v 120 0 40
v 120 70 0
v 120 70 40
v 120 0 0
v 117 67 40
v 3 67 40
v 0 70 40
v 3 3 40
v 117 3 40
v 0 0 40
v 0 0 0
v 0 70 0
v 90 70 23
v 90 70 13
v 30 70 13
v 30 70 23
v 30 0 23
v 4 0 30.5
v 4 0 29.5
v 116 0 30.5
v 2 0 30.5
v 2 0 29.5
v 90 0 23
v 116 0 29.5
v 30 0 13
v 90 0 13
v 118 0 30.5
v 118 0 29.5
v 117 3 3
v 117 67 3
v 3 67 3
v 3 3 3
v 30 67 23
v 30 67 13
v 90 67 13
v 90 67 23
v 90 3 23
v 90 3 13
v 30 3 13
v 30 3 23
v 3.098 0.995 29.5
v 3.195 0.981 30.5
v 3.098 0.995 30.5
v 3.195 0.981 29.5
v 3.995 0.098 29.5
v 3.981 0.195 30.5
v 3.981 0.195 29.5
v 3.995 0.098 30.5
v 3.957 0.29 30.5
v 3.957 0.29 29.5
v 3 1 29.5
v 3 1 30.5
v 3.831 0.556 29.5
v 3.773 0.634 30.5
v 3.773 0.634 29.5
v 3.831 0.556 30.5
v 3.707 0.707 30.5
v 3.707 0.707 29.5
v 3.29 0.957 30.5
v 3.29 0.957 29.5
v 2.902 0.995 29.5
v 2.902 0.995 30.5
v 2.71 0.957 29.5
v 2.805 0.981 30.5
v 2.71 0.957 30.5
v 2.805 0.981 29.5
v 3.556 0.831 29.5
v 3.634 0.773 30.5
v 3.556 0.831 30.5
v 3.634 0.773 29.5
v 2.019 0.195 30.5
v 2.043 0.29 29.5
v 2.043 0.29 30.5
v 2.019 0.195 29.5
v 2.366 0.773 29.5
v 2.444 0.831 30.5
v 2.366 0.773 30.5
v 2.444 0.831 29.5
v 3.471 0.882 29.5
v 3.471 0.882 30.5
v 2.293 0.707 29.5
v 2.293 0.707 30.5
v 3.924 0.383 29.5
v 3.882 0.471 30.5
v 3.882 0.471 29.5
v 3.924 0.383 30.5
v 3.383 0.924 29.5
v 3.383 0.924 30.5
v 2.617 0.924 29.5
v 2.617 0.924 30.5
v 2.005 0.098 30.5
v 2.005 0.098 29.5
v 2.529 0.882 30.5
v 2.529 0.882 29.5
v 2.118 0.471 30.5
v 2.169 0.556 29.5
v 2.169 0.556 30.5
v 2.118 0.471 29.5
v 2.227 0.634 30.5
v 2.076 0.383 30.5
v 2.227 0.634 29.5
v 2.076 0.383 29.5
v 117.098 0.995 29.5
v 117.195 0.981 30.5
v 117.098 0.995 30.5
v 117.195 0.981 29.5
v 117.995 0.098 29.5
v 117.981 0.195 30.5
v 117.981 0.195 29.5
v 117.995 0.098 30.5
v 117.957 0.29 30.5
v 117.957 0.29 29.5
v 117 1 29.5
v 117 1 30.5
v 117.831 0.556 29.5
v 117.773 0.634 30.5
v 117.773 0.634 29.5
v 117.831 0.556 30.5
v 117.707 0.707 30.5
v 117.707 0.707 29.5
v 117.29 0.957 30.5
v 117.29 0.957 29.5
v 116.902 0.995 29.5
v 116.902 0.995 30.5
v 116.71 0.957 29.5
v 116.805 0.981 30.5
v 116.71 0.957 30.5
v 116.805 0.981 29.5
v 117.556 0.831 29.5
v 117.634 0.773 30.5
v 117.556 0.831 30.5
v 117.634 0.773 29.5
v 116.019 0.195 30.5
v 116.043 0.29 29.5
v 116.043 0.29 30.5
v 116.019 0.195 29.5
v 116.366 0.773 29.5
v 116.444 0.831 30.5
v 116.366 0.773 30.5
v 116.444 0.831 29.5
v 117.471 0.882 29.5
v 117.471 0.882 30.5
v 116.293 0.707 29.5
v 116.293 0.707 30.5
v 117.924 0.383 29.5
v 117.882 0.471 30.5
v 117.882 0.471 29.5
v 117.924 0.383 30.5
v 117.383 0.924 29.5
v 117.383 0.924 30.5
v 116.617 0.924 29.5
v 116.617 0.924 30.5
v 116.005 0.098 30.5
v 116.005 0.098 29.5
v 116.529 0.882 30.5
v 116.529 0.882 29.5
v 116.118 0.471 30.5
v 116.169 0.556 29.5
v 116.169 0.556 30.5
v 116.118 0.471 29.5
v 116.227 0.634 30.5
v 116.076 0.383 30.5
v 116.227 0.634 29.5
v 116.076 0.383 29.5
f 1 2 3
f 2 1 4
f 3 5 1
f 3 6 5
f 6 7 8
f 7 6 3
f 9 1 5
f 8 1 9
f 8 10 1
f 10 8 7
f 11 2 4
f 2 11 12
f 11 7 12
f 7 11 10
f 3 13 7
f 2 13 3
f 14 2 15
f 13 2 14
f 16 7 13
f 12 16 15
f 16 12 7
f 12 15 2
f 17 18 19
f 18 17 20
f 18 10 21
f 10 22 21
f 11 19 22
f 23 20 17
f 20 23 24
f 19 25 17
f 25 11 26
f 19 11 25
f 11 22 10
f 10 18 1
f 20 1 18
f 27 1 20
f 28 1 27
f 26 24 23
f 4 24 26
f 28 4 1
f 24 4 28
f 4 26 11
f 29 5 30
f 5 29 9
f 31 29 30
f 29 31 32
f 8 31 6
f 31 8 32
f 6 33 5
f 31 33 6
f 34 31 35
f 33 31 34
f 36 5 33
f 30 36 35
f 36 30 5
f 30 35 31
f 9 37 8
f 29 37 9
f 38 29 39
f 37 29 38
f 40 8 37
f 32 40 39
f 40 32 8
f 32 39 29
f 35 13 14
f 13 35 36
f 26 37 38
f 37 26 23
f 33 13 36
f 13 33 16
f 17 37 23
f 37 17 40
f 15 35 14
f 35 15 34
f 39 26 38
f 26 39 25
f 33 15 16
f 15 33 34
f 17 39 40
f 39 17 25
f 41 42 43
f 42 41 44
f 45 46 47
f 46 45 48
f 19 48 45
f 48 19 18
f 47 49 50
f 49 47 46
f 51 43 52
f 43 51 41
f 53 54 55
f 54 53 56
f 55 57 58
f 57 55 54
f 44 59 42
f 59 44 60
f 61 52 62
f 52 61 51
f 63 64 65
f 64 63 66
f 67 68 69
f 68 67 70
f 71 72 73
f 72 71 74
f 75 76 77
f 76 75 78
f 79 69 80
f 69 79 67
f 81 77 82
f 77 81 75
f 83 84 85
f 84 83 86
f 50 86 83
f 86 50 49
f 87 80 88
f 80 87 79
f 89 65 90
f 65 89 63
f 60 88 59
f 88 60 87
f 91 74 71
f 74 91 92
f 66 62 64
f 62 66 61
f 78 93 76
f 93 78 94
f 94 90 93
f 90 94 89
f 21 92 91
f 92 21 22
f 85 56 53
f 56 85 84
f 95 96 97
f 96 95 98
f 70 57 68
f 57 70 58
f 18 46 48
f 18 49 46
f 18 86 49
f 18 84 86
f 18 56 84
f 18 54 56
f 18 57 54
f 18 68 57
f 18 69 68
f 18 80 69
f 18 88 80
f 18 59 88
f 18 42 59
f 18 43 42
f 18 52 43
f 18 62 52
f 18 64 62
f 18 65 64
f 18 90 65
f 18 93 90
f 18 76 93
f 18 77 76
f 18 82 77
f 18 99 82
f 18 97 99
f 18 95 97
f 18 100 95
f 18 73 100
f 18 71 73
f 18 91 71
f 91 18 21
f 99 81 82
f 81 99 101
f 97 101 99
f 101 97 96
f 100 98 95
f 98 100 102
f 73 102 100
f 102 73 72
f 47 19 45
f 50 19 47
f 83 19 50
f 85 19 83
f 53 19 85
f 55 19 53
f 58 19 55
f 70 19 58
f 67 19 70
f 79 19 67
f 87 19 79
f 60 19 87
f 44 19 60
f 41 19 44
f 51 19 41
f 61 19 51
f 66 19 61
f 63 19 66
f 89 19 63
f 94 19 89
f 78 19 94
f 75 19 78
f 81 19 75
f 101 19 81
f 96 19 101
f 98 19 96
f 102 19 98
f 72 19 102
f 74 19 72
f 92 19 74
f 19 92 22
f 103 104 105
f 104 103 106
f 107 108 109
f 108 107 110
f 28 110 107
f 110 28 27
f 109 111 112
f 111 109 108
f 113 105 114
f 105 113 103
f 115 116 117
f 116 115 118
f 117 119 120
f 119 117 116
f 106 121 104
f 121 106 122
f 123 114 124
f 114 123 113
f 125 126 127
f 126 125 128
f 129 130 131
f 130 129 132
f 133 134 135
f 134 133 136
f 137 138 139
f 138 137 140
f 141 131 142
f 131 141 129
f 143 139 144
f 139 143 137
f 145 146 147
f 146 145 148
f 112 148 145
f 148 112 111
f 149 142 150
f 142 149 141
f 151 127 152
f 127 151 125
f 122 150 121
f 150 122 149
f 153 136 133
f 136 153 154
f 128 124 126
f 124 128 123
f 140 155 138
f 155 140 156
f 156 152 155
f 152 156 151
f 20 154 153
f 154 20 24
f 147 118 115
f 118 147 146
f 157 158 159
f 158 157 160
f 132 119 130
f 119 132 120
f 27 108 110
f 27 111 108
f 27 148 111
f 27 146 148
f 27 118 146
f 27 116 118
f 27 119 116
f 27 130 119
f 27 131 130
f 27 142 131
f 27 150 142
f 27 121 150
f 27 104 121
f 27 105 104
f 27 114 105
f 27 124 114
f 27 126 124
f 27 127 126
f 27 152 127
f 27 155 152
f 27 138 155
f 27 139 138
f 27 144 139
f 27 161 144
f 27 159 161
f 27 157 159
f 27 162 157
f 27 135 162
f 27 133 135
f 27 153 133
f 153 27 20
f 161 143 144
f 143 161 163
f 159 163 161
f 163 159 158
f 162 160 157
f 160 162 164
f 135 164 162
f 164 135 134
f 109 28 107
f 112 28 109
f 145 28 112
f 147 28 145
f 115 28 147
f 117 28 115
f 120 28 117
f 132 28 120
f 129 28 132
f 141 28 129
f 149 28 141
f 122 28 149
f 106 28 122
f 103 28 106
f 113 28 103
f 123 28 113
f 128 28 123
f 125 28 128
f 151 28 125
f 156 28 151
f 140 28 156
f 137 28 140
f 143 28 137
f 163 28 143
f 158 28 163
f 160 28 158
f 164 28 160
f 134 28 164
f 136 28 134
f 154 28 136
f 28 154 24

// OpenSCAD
// Buffer tank for mini horizontal gel-electrophoresis box
// Outer dimensions: 120 mm (X) x 70 mm (Y) x 40 mm (Z)
// Wall thickness: 3 mm
// Floor thickness: 3 mm
// Platform: 60 mm (X) x 70 mm (Y) x 10 mm (Z), centered in X, z = 13
// Electrode holes: 2 holes, 2 mm diameter, at z = 30, y = 0, at each X end

// Dimensions
tank_length = 120;   // X dimension
tank_width = 70;    // Y dimension
tank_height = 40;   // Z dimension
wall_thickness = 3; // Wall and floor thickness
platform_length = 60; // X dimension of platform
platform_width = 70;  // Y dimension of platform (full width)
platform_height = 10; // Z dimension of platform
platform_z = 13;    // Platform top height above floor (z = 3)
hole_diameter = 2;  // Electrode hole diameter
hole_z = 30;        // Electrode hole height

// Main tank body (outer dimensions)
outer = [tank_length, tank_width, tank_height];

// Inner dimensions (subtracting wall thickness)
inner_length = tank_length - 2 * wall_thickness;
inner_width = tank_width - 2 * wall_thickness;
inner_height = tank_height - wall_thickness;

// Platform dimensions (inner)
platform_inner_length = platform_length;
platform_inner_width = platform_width;

// Create the tank
difference() {
  // Outer shell
  cube(outer, center = false);
  
  // Inner hollow
  translate([wall_thickness, wall_thickness, wall_thickness]) {
    cube([inner_length, inner_width, inner_height], center = false);
  }
  
  // Platform (cut out from inner volume)
  translate([(tank_length - platform_length) / 2, 0, platform_z]) {
    cube([platform_length, platform_width, platform_height], center = false);
  }
  
  // Electrode holes (at each X end)
  // Left hole
  translate([wall_thickness, 0, hole_z]) {
    cylinder(h = 1, d = hole_diameter, center = true, $fn = 64);
  }
  
  // Right hole
  translate([tank_length - wall_thickness, 0, hole_z]) {
    cylinder(h = 1, d = hole_diameter, center = true, $fn = 64);
  }
}
